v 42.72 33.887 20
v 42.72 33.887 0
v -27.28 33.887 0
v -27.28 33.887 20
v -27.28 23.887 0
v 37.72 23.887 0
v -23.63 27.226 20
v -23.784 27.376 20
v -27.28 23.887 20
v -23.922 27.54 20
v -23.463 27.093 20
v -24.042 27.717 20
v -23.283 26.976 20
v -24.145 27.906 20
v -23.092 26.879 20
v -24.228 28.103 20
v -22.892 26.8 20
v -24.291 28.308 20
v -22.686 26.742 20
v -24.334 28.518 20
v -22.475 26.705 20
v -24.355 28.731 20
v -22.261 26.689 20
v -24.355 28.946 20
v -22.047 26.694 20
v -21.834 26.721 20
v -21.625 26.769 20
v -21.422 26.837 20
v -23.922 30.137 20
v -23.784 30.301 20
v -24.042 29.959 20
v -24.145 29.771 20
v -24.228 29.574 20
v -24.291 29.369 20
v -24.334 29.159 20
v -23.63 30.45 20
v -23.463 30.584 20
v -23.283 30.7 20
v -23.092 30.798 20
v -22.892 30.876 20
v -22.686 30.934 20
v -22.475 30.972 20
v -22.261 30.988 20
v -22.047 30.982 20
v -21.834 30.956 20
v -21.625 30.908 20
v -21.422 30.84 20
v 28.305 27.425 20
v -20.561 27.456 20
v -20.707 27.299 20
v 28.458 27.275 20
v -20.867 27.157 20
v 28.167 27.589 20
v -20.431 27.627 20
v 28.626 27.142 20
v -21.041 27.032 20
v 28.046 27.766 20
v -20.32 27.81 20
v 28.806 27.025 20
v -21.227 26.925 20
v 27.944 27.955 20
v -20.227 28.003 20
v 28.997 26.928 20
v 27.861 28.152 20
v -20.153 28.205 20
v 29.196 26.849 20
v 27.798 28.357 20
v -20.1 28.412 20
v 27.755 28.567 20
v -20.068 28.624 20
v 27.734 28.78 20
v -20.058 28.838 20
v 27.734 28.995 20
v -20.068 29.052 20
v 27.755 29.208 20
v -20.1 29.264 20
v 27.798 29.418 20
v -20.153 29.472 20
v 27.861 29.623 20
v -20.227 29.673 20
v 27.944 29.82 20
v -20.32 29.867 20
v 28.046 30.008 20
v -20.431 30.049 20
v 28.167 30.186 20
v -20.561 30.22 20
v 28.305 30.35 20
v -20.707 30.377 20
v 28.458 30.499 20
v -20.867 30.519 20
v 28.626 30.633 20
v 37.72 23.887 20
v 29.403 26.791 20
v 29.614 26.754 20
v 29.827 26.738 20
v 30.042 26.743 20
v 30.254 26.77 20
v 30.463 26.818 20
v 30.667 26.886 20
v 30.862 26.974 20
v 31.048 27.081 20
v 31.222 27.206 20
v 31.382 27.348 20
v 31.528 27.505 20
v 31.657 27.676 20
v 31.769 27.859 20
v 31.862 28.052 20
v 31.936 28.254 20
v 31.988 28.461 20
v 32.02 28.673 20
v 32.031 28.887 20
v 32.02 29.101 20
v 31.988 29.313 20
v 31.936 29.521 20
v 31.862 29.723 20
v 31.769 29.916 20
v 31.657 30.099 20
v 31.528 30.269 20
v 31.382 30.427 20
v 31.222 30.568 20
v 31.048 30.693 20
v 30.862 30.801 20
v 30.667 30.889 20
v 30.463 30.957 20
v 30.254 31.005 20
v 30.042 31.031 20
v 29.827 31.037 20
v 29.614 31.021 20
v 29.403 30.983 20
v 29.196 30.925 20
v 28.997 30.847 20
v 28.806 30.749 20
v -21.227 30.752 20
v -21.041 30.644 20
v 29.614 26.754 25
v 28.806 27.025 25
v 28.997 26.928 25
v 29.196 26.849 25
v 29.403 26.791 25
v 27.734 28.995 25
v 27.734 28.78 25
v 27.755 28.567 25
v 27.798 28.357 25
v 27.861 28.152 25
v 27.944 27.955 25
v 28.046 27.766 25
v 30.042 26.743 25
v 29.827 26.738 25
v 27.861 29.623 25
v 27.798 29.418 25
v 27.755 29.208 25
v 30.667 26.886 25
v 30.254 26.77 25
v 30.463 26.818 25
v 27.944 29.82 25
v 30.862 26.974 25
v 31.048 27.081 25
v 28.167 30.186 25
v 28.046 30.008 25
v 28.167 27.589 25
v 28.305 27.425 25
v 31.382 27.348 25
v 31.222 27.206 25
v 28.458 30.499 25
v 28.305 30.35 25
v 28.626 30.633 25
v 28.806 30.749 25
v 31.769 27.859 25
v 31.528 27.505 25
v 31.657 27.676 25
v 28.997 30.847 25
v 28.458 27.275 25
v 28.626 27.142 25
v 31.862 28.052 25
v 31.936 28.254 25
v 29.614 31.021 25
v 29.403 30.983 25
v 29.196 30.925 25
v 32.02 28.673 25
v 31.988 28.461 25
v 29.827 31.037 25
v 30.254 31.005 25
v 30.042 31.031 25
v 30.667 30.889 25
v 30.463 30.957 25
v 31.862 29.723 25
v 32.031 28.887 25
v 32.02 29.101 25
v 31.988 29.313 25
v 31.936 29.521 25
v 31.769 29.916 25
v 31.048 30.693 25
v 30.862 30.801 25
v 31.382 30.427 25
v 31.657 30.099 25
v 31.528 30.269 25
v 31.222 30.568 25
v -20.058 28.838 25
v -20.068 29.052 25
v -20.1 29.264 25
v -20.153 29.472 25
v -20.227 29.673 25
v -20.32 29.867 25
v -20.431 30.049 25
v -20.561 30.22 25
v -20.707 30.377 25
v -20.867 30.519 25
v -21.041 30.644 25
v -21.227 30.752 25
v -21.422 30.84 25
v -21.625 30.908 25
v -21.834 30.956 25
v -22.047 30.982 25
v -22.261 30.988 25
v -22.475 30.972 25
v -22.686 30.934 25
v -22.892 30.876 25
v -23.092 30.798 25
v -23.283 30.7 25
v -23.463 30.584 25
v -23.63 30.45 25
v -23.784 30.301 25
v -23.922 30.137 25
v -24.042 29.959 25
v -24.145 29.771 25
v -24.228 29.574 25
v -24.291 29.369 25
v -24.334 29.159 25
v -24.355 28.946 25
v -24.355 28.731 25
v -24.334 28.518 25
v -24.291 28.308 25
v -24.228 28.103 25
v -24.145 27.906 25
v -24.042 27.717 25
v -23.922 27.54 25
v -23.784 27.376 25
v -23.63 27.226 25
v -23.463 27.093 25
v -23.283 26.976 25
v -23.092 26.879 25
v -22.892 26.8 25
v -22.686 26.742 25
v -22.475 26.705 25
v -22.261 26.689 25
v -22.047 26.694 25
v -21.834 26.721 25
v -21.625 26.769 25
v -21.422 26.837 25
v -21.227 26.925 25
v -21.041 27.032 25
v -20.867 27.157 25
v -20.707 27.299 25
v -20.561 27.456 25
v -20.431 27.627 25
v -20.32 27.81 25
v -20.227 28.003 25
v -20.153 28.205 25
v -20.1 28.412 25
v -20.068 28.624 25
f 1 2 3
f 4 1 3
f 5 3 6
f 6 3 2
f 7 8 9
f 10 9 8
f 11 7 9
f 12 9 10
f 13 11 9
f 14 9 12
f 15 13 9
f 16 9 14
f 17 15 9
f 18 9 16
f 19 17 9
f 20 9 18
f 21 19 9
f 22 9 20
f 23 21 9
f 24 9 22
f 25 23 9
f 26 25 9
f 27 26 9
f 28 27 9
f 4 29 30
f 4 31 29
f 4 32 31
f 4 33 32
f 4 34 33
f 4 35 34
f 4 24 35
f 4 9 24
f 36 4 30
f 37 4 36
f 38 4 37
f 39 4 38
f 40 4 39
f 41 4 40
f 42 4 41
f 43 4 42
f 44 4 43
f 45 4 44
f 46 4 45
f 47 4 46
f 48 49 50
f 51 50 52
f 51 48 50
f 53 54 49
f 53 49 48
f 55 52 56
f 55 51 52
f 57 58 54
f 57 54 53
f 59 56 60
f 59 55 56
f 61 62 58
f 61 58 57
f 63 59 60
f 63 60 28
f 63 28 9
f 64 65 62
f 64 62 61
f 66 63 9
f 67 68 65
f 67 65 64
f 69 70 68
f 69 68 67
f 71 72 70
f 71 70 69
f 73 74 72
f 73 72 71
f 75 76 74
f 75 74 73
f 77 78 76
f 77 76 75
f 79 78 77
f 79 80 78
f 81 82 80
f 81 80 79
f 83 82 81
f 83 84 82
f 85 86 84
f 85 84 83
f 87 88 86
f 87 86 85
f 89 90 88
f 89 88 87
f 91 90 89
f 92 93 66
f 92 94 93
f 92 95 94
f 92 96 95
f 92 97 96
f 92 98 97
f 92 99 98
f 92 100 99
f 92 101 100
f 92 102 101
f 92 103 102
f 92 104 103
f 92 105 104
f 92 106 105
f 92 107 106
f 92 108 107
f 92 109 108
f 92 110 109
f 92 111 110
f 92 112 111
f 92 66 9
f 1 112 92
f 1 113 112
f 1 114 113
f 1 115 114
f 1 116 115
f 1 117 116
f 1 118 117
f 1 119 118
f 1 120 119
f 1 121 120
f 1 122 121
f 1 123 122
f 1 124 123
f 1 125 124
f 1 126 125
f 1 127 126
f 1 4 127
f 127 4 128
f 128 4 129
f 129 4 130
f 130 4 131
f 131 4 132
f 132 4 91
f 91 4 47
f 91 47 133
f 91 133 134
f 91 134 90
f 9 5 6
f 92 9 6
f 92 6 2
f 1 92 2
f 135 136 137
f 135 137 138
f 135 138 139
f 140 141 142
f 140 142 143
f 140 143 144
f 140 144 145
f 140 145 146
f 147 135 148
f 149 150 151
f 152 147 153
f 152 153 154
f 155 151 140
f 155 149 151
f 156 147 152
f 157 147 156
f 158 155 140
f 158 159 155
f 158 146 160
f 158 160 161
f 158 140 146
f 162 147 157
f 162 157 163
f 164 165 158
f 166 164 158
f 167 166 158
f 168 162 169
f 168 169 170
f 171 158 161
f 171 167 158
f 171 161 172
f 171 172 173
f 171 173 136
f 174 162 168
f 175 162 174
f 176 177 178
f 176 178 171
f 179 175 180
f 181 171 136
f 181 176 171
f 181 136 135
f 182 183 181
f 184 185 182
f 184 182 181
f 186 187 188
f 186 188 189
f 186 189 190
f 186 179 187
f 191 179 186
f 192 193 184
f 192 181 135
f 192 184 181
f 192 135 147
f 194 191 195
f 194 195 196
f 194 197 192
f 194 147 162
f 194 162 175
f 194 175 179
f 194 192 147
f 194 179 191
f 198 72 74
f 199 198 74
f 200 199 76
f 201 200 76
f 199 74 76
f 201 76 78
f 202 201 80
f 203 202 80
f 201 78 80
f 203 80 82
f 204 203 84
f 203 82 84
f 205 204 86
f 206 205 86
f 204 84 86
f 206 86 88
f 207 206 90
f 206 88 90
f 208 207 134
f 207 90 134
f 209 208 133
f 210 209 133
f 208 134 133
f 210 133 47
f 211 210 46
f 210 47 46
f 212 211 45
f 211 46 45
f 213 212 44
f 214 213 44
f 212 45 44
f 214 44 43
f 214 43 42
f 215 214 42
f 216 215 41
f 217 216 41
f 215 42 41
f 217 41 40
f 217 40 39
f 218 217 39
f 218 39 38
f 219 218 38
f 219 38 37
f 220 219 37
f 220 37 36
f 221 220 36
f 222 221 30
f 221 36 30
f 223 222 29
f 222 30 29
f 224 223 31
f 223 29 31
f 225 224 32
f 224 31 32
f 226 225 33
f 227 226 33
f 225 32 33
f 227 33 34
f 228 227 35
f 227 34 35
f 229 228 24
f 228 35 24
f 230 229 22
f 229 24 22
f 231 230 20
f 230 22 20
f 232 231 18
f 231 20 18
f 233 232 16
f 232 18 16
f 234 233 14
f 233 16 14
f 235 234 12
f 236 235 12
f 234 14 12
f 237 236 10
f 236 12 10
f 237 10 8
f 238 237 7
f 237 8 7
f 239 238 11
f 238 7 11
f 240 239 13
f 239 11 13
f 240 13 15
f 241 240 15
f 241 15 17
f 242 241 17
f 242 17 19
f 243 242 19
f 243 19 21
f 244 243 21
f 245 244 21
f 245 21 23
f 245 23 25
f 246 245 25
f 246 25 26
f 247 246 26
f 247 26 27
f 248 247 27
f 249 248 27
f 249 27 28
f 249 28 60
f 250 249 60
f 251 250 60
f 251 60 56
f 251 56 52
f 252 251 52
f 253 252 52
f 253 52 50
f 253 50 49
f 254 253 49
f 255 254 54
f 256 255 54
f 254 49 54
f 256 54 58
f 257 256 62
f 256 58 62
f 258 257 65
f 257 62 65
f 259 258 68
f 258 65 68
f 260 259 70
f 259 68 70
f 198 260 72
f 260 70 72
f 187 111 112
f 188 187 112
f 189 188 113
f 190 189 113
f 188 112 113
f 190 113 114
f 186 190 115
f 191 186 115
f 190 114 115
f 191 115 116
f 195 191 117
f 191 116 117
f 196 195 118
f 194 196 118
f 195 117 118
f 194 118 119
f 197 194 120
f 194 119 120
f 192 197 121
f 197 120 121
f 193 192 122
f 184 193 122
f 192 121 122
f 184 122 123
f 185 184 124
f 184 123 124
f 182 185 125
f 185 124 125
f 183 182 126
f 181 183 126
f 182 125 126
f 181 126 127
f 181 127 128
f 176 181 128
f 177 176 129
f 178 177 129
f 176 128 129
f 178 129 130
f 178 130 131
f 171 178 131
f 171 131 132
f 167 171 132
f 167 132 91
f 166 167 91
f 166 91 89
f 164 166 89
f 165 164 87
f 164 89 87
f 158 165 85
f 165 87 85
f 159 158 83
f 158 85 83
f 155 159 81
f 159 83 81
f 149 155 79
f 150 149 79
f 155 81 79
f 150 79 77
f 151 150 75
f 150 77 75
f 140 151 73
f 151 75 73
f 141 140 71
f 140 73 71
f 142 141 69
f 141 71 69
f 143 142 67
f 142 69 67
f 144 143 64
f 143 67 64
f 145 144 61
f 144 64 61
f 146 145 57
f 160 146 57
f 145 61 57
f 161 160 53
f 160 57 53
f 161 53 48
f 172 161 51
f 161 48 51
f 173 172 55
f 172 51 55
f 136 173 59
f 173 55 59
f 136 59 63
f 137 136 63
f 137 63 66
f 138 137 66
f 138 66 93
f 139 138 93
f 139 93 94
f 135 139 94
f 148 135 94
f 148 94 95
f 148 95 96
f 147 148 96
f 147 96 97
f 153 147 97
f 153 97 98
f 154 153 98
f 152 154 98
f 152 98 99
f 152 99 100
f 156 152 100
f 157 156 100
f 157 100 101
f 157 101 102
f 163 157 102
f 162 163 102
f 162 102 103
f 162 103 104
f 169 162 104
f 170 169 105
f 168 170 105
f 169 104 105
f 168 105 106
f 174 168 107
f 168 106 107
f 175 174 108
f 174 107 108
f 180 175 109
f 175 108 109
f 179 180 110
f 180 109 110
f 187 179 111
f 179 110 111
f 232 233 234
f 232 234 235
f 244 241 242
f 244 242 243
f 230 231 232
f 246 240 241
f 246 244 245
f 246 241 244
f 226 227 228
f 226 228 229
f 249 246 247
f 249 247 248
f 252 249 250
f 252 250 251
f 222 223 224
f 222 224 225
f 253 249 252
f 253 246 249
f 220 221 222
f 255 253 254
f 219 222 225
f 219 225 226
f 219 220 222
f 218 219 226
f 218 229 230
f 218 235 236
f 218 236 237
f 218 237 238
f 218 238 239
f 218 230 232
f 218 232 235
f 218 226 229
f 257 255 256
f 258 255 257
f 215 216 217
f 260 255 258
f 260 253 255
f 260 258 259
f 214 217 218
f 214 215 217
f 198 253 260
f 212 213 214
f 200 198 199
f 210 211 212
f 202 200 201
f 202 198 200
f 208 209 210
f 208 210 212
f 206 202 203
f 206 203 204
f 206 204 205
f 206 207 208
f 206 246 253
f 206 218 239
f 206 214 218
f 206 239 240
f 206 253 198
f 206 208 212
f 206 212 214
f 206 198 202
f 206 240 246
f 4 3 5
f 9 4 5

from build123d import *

# Parameters (mm, degrees)
F1_DEPTH = 20
F2_R     = 2.15
F3_DEPTH = 5


with BuildPart() as f1:
    # F0 (on Top) → F1 (new body)
    with BuildSketch(Plane.XY):
        Polygon((42.720473, 33.887387), (-27.279527, 33.887387), (-27.279527, 23.887387), (37.720473, 23.887387), align=None)
    extrude(amount=F1_DEPTH)

    # F2 (on face) → F3 (join)
    with BuildSketch(Plane.XY.offset(20)):
        with Locations((-22.207731, 28.838353)):
            Circle(F2_R)
        with Locations((29.88103, 28.887387)):
            Circle(F2_R)
    extrude(amount=F3_DEPTH)


solid = f1.part
